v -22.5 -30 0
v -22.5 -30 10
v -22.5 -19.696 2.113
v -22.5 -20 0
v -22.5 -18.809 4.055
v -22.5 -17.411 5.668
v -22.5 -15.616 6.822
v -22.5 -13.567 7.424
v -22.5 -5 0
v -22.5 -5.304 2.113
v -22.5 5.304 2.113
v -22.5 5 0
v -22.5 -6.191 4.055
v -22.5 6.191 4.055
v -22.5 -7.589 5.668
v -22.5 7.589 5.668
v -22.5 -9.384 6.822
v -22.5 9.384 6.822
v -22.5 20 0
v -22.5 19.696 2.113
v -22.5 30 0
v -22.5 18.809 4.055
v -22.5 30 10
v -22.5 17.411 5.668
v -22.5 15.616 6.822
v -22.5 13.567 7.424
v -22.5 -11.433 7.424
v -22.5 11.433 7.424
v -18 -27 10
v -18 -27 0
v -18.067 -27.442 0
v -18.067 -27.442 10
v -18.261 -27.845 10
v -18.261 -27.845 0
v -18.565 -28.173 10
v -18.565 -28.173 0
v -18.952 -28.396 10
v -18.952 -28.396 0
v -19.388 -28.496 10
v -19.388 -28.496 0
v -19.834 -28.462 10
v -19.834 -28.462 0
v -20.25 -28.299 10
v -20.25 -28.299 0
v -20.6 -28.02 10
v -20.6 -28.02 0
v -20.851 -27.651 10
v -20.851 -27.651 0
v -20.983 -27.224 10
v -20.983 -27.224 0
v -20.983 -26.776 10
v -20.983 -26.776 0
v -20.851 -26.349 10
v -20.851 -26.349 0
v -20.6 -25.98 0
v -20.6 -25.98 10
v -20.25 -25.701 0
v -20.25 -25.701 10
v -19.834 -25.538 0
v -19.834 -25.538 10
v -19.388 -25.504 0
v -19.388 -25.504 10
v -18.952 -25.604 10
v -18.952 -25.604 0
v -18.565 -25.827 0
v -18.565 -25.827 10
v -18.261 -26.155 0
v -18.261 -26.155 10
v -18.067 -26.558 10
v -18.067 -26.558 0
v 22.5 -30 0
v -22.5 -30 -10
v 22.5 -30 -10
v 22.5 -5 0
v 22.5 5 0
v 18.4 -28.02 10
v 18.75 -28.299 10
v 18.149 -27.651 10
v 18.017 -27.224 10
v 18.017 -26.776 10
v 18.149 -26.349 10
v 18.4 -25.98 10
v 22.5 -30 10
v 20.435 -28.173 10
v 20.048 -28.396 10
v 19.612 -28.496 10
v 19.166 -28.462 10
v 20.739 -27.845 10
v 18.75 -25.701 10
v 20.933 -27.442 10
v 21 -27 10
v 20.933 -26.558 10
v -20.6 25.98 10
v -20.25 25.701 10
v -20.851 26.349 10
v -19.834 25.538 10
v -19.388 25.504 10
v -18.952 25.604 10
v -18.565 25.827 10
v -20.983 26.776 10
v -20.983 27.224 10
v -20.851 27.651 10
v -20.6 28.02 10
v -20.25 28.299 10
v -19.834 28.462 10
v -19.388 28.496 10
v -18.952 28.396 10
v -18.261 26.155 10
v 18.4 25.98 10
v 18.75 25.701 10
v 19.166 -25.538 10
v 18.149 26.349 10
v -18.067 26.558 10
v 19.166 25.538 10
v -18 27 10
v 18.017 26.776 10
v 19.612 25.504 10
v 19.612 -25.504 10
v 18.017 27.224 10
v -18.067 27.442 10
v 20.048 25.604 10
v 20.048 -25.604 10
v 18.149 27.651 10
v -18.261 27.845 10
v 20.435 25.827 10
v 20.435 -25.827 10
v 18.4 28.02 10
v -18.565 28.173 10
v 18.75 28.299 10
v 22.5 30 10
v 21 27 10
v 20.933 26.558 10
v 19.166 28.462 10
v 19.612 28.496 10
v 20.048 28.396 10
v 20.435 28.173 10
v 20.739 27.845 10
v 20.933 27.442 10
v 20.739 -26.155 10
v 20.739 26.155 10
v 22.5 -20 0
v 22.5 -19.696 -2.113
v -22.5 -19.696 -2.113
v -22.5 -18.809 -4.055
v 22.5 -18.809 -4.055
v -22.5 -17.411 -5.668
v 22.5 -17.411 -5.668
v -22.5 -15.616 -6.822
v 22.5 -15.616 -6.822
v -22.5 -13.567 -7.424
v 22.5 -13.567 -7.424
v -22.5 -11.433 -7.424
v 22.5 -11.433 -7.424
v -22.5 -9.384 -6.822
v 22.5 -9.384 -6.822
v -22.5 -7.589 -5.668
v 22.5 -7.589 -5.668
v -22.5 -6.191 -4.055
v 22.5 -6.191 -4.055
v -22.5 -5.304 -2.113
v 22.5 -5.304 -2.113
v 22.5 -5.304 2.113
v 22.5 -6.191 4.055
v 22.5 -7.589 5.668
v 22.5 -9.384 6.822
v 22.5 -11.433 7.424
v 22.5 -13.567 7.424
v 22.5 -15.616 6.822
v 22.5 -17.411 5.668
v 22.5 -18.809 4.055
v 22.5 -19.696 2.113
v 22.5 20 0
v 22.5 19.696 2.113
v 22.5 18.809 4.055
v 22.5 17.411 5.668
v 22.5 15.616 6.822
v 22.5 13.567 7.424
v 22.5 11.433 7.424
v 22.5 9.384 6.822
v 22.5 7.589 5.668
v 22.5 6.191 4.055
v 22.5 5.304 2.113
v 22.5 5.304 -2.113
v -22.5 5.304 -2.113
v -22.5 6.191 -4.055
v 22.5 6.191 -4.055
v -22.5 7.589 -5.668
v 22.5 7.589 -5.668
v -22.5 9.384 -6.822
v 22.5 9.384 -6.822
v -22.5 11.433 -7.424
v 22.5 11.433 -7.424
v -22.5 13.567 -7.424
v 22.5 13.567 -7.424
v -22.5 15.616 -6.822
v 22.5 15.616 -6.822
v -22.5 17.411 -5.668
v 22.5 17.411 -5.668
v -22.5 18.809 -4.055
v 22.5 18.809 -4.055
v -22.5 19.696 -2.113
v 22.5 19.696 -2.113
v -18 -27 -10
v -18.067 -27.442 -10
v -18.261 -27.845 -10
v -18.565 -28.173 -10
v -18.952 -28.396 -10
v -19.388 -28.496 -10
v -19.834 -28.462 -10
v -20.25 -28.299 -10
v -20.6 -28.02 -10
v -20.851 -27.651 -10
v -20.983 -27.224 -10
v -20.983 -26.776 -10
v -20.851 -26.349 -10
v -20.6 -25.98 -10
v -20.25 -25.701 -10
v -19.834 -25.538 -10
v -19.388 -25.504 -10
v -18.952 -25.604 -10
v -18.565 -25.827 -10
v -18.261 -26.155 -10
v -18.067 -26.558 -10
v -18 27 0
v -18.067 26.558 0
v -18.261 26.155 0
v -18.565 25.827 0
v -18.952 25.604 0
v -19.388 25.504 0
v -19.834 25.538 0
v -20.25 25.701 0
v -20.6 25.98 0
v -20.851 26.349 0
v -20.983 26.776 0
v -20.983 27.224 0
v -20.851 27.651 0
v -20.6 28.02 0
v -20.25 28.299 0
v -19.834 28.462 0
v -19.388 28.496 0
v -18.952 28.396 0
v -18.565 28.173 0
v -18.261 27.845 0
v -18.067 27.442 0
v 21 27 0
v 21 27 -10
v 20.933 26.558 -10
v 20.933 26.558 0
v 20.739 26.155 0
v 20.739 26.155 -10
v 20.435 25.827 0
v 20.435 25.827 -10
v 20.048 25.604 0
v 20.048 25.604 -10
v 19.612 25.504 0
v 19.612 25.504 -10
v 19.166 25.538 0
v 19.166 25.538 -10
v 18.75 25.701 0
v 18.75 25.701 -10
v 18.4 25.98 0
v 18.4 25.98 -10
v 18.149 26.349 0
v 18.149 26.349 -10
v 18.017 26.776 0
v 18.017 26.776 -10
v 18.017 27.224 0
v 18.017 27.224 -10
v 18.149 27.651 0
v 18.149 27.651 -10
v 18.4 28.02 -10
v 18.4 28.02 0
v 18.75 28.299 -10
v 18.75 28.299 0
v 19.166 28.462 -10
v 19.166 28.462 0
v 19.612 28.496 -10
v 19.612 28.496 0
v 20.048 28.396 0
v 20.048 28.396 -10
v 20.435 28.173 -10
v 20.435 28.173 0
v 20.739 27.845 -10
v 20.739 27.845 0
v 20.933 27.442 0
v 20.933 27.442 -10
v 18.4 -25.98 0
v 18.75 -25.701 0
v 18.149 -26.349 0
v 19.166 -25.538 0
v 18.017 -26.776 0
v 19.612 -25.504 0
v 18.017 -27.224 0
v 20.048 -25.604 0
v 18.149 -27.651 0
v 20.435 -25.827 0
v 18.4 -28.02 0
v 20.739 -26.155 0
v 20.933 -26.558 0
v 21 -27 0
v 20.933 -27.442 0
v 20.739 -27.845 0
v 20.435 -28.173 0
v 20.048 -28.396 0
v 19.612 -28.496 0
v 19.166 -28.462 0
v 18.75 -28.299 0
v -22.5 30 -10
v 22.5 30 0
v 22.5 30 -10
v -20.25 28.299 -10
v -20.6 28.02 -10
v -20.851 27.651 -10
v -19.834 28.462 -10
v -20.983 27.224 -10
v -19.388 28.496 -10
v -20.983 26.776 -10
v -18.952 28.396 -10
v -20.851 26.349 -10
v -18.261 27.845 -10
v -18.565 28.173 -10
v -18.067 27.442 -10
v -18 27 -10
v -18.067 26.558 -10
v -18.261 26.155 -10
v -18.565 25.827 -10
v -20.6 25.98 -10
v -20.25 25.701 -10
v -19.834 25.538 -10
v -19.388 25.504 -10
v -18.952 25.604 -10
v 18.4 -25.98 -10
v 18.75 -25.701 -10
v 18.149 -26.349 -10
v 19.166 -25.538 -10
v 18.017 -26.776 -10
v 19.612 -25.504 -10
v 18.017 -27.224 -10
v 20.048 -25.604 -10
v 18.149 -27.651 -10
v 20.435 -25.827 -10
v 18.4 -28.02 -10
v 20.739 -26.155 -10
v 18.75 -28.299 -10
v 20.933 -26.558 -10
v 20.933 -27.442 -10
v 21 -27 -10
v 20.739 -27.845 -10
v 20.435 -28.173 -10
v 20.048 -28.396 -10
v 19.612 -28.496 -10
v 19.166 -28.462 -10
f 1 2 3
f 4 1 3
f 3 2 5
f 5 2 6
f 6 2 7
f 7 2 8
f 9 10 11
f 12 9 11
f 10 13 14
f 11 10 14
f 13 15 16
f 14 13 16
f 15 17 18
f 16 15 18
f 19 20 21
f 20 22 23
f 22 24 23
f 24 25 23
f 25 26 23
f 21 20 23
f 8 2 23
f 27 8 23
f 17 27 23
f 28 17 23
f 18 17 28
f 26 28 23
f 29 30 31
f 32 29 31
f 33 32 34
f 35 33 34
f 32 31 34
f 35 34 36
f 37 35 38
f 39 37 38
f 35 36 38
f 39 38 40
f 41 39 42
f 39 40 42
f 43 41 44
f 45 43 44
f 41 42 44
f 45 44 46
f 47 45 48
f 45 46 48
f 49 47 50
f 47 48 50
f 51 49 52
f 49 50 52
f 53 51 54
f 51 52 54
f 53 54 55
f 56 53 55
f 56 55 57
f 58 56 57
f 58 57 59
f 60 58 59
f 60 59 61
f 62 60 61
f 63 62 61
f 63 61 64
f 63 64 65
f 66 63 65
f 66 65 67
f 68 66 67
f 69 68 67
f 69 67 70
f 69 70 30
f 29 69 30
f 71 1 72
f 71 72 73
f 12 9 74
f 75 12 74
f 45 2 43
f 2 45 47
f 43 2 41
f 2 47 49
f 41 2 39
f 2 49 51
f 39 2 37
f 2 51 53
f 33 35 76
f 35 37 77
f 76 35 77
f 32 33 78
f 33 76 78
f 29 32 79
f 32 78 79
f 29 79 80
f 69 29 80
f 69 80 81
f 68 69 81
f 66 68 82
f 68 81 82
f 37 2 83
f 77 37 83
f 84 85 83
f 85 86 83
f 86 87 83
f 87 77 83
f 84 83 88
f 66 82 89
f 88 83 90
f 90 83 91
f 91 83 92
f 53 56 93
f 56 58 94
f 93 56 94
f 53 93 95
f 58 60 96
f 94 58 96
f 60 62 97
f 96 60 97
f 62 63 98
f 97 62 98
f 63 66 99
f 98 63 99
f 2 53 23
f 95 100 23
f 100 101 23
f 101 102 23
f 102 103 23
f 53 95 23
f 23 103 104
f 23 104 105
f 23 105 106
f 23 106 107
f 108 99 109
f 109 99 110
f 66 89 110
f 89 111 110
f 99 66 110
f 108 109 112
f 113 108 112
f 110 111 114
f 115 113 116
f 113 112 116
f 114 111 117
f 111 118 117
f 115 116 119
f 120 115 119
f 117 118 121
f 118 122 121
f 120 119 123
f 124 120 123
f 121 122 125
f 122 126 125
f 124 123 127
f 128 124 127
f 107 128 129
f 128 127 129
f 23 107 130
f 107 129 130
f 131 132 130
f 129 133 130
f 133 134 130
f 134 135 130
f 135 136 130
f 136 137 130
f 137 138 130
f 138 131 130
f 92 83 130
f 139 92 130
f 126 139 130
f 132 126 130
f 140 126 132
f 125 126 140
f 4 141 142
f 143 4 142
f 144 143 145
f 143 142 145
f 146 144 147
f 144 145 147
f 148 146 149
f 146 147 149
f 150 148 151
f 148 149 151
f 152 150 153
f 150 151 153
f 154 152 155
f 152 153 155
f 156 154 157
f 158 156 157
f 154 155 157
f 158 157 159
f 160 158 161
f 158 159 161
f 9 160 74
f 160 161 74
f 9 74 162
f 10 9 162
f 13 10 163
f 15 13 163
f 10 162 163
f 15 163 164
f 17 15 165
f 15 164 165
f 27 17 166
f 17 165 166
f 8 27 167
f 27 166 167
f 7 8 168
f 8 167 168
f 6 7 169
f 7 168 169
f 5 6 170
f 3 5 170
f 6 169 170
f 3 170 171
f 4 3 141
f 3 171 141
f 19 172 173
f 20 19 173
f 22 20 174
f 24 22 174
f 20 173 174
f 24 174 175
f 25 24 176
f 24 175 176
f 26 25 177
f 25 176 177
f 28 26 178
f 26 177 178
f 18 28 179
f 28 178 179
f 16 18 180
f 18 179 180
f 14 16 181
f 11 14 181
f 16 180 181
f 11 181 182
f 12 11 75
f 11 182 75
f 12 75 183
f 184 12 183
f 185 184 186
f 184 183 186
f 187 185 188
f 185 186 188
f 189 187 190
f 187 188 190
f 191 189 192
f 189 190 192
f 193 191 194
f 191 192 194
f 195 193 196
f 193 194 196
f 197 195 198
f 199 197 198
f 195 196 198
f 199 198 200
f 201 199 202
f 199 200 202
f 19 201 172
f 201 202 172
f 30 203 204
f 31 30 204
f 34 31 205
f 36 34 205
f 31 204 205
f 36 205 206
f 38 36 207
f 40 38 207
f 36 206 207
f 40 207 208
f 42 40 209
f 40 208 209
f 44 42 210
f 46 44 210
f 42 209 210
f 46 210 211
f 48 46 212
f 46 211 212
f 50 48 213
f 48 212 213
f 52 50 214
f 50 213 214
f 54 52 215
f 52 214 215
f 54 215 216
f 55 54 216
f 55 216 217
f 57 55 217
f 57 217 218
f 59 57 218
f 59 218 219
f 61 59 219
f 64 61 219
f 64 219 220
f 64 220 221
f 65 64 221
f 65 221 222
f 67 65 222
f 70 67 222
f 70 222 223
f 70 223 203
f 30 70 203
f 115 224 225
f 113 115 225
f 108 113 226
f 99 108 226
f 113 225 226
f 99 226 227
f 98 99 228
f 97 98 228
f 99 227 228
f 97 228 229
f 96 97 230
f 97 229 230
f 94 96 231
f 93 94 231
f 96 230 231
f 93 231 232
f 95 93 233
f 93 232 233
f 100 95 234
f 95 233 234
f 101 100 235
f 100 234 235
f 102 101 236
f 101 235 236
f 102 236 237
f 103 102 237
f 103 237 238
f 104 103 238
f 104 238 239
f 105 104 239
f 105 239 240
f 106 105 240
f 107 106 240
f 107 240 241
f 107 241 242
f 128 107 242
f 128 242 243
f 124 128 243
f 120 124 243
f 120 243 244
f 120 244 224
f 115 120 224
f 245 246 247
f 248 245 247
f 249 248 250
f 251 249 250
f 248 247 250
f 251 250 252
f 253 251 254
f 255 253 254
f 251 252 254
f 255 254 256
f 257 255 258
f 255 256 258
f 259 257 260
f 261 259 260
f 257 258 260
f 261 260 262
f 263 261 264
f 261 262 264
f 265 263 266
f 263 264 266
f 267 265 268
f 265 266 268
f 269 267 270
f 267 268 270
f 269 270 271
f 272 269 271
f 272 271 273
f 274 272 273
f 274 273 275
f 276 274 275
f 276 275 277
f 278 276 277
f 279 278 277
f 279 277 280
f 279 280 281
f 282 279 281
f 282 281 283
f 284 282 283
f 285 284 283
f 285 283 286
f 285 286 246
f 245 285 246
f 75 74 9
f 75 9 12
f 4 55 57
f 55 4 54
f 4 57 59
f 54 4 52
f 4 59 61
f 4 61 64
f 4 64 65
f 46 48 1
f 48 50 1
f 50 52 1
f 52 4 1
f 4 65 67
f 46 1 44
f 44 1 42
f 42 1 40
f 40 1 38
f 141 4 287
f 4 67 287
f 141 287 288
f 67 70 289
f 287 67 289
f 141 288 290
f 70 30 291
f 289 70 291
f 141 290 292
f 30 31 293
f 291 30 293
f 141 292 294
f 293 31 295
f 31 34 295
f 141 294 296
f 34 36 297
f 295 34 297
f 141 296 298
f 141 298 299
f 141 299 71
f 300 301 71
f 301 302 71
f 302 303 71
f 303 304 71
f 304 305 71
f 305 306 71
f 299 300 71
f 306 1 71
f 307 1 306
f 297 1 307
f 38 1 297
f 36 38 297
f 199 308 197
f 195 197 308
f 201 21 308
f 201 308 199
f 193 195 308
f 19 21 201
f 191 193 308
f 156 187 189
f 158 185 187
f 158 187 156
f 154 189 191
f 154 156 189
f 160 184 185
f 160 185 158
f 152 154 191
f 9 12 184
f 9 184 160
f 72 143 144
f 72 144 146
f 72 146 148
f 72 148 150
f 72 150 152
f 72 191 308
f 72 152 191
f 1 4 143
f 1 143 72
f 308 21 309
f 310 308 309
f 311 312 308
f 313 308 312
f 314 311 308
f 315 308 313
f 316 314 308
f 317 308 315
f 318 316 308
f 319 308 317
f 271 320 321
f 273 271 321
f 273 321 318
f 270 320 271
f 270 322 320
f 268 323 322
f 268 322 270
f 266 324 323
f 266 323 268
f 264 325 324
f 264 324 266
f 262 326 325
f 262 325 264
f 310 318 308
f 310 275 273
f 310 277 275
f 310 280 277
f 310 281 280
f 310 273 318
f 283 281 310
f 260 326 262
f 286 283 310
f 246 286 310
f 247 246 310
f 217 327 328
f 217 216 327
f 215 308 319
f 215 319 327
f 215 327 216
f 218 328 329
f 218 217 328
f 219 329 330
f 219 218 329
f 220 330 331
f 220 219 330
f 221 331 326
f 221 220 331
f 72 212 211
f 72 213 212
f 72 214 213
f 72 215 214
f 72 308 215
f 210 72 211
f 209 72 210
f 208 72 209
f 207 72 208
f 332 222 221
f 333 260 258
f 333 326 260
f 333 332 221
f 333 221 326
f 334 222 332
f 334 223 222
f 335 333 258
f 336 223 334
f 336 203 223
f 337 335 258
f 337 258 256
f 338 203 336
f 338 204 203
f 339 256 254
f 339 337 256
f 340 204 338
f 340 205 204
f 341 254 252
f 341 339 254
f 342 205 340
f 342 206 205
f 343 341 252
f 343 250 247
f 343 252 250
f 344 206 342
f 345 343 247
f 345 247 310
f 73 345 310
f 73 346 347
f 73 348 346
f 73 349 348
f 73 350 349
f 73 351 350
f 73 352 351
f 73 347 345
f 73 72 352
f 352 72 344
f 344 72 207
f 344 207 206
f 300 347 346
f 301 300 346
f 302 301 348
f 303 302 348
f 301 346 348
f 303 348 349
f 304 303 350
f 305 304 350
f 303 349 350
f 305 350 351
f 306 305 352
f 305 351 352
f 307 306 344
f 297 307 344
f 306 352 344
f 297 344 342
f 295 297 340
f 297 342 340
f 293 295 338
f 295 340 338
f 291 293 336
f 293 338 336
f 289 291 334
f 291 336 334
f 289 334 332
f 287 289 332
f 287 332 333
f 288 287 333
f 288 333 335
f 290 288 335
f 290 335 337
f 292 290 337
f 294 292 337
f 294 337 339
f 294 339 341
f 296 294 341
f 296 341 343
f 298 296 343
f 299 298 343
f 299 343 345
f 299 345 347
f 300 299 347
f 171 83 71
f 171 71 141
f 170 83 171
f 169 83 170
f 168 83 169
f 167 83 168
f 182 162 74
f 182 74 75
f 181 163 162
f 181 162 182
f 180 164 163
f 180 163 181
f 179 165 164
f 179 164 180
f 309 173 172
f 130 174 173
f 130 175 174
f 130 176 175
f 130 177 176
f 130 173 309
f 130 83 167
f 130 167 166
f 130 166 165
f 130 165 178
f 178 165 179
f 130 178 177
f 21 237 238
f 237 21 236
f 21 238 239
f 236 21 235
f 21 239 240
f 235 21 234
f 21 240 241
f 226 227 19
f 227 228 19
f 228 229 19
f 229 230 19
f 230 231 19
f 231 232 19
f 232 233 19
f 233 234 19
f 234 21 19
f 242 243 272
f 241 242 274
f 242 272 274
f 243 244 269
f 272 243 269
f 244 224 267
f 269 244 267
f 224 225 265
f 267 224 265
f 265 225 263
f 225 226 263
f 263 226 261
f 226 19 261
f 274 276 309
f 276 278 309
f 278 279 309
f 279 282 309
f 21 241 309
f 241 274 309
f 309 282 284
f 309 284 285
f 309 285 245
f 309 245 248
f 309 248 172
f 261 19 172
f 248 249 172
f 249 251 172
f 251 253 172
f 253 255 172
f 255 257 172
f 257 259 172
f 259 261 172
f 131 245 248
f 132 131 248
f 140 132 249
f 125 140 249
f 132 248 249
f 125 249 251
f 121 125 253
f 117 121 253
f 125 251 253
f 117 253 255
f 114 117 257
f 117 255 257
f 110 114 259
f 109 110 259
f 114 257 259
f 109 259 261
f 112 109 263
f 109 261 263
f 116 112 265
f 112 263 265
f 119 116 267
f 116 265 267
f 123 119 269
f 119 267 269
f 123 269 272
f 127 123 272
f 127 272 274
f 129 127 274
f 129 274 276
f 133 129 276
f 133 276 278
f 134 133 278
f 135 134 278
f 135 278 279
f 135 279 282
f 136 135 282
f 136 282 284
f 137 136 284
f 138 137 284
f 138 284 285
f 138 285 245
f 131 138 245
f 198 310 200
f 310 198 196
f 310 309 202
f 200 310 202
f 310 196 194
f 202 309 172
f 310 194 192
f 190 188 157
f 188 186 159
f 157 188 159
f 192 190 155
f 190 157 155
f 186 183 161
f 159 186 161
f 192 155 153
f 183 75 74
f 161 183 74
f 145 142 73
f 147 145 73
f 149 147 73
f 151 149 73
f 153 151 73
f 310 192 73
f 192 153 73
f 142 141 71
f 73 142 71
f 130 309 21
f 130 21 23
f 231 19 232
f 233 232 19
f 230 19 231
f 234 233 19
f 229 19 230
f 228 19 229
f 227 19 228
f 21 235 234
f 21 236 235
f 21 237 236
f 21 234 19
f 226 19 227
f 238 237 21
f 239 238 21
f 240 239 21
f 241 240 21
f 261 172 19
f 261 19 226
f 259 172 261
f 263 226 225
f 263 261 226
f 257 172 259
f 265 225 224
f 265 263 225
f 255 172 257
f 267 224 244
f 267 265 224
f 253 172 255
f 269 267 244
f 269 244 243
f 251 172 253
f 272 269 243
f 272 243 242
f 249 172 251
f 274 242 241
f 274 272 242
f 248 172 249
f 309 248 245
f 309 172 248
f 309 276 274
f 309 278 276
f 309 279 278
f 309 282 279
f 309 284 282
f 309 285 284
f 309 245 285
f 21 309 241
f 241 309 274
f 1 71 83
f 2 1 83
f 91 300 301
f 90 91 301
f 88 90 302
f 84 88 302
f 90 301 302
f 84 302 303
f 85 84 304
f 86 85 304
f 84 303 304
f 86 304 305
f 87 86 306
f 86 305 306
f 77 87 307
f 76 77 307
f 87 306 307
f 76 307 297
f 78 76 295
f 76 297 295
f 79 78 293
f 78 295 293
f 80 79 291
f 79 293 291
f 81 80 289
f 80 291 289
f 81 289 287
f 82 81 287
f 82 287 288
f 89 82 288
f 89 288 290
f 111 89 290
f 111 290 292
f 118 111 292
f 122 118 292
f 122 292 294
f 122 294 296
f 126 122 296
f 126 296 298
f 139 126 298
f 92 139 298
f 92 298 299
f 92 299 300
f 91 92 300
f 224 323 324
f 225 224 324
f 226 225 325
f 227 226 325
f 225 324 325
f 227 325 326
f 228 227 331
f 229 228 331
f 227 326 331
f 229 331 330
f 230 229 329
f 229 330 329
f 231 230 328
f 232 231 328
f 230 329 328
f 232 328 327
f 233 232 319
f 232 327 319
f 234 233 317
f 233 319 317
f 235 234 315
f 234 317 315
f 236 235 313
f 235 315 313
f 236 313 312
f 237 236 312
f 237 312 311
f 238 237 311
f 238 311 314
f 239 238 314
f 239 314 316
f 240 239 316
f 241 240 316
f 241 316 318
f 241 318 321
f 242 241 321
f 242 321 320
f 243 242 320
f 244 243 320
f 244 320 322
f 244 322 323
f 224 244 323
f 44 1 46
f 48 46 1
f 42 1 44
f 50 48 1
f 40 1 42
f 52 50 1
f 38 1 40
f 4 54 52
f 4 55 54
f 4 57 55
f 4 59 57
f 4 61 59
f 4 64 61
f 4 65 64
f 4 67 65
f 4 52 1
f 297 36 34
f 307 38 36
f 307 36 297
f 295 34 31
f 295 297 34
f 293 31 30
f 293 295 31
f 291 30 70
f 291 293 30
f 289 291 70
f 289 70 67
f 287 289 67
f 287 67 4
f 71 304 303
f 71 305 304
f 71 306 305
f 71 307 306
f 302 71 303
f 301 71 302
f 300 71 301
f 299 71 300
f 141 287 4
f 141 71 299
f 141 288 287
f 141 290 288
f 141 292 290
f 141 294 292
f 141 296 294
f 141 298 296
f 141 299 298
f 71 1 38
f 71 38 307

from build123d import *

# Parameters (mm, degrees)
F0_W      = 60
F0_H      = 10
F1_DEPTH  = 22.5
F1_FACE_W = 45
F1_FACE_H = 60
F2_DEPTH  = 10
F3_R      = 7.5
F4_DEPTH  = 45.001
F5_R      = 1.5
F6_DEPTH  = 20.001


with BuildPart() as f1:
    # F0 (on Right) → F1 (new body, symmetric)
    with BuildSketch(Plane.YZ):
        with Locations((0, 5)):
            Rectangle(F0_W, F0_H)
    extrude(amount=F1_DEPTH, both=True)


with BuildPart() as f2:
    # F1_face (on face) → F2 (new body)
    with BuildSketch(Plane(origin=(0, 0, 0), x_dir=(1, 0, 0), z_dir=(0, 0, -1))):
        Rectangle(F1_FACE_W, F1_FACE_H)
    extrude(amount=F2_DEPTH)


with BuildPart() as f4_tool:
    # F3 (on face) → F4 (new body, through all)
    with BuildSketch(Plane.YZ.offset(22.5)):
        with Locations((-12.5, 0)):
            Circle(F3_R)
        with Locations((12.5, 0)):
            Circle(F3_R)
    extrude(amount=-F4_DEPTH)


with BuildPart() as f1_1:
    add(f1.part)

    # F4: cut by f4_tool
    add(f4_tool.part, mode=Mode.SUBTRACT)


with BuildPart() as f2_1:
    add(f2.part)

    # F4: cut by f4_tool
    add(f4_tool.part, mode=Mode.SUBTRACT)


with BuildPart() as f6_tool:
    # F5 (on face) → F6 (new body, through all)
    with BuildSketch(Plane(origin=(0, 0, -10), x_dir=(1, 0, 0), z_dir=(0, 0, -1))):
        with Locations((19.5, 27)):
            Circle(F5_R)
        with Locations((-19.5, 27)):
            Circle(F5_R)
        with Locations((19.5, -27)):
            Circle(F5_R)
        with Locations((-19.5, -27)):
            Circle(F5_R)
    extrude(amount=-F6_DEPTH)


with BuildPart() as f1_2:
    add(f1_1.part)

    # F6: cut by f6_tool
    add(f6_tool.part, mode=Mode.SUBTRACT)


with BuildPart() as f2_2:
    add(f2_1.part)

    # F6: cut by f6_tool
    add(f6_tool.part, mode=Mode.SUBTRACT)


solid = Compound([f1_2.part, f2_2.part])
